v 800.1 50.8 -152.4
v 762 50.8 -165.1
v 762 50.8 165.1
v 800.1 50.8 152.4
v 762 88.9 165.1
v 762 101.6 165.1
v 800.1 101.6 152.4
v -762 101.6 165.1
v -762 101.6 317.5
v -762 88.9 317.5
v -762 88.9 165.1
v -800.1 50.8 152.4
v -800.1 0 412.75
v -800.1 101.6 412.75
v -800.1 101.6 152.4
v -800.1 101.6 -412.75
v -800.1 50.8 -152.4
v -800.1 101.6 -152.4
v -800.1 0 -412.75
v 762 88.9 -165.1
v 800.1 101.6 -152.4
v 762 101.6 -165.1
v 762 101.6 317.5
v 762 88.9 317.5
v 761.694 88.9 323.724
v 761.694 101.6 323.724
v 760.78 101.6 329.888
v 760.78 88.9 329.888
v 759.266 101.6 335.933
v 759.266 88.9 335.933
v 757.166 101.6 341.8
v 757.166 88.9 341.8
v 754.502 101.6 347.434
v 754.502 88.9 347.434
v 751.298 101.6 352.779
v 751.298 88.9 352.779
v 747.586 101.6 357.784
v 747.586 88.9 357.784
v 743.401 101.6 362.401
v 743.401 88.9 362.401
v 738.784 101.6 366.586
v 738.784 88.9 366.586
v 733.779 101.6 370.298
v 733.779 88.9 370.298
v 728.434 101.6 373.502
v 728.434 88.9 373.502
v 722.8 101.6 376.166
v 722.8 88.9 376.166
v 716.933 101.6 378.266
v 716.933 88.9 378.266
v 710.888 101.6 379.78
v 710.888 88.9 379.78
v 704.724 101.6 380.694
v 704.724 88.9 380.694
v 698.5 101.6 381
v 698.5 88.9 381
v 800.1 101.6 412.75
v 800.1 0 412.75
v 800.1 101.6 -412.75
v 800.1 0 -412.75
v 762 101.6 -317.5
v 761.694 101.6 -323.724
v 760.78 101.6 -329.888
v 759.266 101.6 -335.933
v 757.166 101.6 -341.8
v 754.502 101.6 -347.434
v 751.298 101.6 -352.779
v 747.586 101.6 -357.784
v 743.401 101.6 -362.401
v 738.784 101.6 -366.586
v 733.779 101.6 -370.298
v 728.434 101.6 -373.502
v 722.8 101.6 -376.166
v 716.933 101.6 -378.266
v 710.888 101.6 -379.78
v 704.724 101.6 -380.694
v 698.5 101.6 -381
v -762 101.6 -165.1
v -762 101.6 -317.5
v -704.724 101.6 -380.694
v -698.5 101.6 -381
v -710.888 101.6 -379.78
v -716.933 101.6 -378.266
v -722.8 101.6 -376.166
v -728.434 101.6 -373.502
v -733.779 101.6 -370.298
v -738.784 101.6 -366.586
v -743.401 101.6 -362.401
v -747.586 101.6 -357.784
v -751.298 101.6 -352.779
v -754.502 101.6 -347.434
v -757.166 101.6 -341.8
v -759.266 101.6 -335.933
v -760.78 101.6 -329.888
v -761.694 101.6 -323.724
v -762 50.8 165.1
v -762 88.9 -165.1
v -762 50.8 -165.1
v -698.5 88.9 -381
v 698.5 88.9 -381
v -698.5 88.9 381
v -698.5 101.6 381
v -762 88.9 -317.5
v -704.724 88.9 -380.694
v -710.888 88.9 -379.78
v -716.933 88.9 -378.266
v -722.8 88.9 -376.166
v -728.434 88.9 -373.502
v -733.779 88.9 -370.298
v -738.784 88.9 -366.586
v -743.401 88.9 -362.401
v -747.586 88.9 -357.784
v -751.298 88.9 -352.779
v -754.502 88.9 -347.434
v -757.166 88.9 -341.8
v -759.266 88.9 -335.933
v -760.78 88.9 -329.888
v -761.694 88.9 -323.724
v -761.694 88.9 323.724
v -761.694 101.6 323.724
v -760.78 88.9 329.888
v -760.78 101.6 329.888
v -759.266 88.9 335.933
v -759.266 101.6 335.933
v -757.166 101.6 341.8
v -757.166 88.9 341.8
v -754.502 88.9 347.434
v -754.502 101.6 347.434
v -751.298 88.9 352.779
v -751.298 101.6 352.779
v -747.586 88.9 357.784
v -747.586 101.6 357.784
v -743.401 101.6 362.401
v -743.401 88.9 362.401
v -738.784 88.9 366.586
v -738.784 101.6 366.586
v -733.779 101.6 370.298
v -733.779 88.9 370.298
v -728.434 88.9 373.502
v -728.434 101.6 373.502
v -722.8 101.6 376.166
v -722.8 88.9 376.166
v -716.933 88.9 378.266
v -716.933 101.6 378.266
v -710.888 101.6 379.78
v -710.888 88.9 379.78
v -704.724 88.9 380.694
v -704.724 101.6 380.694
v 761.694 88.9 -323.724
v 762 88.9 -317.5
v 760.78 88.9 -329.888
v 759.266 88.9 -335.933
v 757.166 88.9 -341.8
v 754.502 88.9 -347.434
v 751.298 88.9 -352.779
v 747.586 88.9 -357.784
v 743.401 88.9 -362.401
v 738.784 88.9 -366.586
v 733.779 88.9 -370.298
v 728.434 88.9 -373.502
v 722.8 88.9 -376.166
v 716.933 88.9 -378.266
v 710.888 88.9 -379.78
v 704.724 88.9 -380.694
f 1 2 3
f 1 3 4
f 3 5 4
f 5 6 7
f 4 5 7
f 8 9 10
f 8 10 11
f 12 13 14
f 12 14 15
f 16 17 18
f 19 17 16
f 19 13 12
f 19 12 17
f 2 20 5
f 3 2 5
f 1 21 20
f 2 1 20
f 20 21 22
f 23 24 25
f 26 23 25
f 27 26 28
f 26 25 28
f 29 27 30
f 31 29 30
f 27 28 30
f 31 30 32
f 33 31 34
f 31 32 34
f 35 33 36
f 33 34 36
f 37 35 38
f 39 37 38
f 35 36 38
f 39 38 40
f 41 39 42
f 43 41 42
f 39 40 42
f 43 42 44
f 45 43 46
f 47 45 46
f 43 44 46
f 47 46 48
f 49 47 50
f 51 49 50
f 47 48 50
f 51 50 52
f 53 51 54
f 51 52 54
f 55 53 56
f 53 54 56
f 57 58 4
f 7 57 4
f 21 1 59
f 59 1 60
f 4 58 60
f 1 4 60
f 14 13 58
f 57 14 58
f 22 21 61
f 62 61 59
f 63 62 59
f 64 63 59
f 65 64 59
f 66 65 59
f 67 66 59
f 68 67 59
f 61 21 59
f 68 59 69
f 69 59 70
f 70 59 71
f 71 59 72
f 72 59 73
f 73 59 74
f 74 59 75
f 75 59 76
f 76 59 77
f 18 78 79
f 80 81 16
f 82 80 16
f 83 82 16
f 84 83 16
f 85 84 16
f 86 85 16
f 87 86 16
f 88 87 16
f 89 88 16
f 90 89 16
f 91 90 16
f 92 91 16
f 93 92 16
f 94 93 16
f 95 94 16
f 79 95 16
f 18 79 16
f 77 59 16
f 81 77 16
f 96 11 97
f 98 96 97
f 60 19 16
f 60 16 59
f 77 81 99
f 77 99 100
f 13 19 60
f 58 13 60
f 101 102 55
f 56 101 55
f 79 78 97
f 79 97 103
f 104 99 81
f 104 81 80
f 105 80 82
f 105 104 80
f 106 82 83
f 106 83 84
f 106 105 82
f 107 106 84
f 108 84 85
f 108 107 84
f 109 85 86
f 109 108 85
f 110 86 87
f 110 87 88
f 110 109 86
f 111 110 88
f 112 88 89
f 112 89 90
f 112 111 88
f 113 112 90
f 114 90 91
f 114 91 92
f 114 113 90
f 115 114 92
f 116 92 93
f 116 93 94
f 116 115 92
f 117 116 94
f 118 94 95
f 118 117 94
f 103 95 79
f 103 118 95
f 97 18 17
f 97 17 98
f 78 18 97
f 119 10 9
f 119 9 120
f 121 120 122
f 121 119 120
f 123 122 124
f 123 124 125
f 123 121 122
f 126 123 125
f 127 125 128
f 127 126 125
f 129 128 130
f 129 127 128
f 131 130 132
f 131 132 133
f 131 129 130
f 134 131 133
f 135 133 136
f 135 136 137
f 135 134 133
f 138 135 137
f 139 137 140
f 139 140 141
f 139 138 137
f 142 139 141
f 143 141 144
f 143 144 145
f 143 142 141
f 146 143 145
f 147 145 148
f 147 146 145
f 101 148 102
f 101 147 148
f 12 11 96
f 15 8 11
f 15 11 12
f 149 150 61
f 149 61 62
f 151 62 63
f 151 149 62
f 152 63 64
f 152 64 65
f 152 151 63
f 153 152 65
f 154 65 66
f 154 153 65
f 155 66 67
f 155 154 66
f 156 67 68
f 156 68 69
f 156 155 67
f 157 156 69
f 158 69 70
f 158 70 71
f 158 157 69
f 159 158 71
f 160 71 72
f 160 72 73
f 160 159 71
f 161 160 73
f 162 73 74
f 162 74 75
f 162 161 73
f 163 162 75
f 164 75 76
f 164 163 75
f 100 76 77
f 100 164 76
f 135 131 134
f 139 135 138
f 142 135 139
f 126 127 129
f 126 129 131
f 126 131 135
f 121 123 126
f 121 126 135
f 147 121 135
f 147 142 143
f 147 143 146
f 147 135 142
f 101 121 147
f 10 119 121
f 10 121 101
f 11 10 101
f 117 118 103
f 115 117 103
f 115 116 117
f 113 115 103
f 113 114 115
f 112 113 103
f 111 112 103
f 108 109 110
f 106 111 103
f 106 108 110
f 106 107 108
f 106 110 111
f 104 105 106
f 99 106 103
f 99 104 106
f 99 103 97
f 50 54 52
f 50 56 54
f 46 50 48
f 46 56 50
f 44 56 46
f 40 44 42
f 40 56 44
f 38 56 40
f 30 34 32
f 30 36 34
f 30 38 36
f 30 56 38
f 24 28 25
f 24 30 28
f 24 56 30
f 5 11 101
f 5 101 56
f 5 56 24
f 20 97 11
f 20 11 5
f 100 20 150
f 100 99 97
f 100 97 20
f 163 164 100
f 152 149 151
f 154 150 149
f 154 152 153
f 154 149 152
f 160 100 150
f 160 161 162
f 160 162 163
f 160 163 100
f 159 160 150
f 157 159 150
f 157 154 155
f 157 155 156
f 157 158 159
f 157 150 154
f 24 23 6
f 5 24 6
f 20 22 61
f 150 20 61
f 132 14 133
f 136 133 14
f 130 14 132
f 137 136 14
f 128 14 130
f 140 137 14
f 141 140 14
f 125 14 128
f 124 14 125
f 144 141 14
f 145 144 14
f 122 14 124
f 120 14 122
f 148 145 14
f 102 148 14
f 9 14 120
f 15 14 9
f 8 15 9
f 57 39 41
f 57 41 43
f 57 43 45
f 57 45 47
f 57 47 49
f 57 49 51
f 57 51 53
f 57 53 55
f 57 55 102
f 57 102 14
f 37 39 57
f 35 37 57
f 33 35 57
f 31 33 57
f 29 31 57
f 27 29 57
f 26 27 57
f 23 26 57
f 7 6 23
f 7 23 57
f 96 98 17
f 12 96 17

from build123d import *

# Parameters (mm, degrees)
SKETCH5_W           = 1600.2
SKETCH5_H           = 825.5
BOSS_EXTRUDE1_DEPTH = 101.6
SKETCH6_W           = 1524
SKETCH6_H           = 762
CUT_EXTRUDE1_DEPTH  = 12.7
CUT_EXTRUDE2_DEPTH  = 50.8
CUT_EXTRUDE3_DEPTH  = 50.8
BOSS_EXTRUDE4_DEPTH = 12.7


with BuildPart() as part:
    # Sketch5 → Boss-Extrude1 (new body)
    with BuildSketch(Plane(origin=(0, 0, 0), x_dir=(1, 0, 0), z_dir=(0, 1, 0))):
        Rectangle(SKETCH5_W, SKETCH5_H)
    extrude(amount=BOSS_EXTRUDE1_DEPTH)

    # Sketch6 → Cut-Extrude1 (cut)
    with BuildSketch(Plane(origin=(0, 101.6, 0), x_dir=(1, 0, 0), z_dir=(0, 1, 0))):
        Rectangle(SKETCH6_W, SKETCH6_H)
    extrude(amount=-CUT_EXTRUDE1_DEPTH, mode=Mode.SUBTRACT)

    # Sketch10 → Cut-Extrude2 (cut)
    with BuildSketch(Plane(origin=(0, 101.6, 0), x_dir=(1, 0, 0), z_dir=(0, 1, 0))):
        Polygon((800.1, -152.4), (800.1, 0), (800.1, 152.4), (762, 165.1), (762, 0), (762, -165.1), align=None)
    extrude(amount=-CUT_EXTRUDE2_DEPTH, mode=Mode.SUBTRACT)

    # Sketch12 → Cut-Extrude3 (cut)
    with BuildSketch(Plane(origin=(0, 101.6, 0), x_dir=(1, 0, 0), z_dir=(0, 1, 0))):
        Polygon((-800.1, 0), (-800.1, 152.4), (-762, 165.1), (-762, 0), (-762, -165.1), (-800.1, -152.4), align=None)
    extrude(amount=-CUT_EXTRUDE3_DEPTH, mode=Mode.SUBTRACT)

    # Sketch16 → Boss-Extrude4 (add)
    with BuildSketch(Plane(origin=(0, 88.9, 0), x_dir=(1, 0, 0), z_dir=(0, 1, 0))):
        with BuildLine():
            Line((762, 381), (762, 317.5))
            ThreePointArc((762, 317.5), (743.401280605, 362.401280605), (698.5, 381))
            Line((698.5, 381), (762, 381))
        make_face()
        with BuildLine():
            Line((-762, 317.5), (-762, 381))
            Line((-762, 381), (-698.5, 381))
            ThreePointArc((-698.5, 381), (-743.401280605, 362.401280605), (-762, 317.5))
        make_face()
        with BuildLine():
            Line((-698.5, -381), (-762, -381))
            Line((-762, -381), (-762, -317.5))
            ThreePointArc((-762, -317.5), (-743.401280605, -362.401280605), (-698.5, -381))
        make_face()
        with BuildLine():
            Line((698.5, -381), (762, -381))
            Line((762, -381), (762, -317.5))
            ThreePointArc((762, -317.5), (743.401280605, -362.401280605), (698.5, -381))
        make_face()
    extrude(amount=BOSS_EXTRUDE4_DEPTH)


solid = part.part
